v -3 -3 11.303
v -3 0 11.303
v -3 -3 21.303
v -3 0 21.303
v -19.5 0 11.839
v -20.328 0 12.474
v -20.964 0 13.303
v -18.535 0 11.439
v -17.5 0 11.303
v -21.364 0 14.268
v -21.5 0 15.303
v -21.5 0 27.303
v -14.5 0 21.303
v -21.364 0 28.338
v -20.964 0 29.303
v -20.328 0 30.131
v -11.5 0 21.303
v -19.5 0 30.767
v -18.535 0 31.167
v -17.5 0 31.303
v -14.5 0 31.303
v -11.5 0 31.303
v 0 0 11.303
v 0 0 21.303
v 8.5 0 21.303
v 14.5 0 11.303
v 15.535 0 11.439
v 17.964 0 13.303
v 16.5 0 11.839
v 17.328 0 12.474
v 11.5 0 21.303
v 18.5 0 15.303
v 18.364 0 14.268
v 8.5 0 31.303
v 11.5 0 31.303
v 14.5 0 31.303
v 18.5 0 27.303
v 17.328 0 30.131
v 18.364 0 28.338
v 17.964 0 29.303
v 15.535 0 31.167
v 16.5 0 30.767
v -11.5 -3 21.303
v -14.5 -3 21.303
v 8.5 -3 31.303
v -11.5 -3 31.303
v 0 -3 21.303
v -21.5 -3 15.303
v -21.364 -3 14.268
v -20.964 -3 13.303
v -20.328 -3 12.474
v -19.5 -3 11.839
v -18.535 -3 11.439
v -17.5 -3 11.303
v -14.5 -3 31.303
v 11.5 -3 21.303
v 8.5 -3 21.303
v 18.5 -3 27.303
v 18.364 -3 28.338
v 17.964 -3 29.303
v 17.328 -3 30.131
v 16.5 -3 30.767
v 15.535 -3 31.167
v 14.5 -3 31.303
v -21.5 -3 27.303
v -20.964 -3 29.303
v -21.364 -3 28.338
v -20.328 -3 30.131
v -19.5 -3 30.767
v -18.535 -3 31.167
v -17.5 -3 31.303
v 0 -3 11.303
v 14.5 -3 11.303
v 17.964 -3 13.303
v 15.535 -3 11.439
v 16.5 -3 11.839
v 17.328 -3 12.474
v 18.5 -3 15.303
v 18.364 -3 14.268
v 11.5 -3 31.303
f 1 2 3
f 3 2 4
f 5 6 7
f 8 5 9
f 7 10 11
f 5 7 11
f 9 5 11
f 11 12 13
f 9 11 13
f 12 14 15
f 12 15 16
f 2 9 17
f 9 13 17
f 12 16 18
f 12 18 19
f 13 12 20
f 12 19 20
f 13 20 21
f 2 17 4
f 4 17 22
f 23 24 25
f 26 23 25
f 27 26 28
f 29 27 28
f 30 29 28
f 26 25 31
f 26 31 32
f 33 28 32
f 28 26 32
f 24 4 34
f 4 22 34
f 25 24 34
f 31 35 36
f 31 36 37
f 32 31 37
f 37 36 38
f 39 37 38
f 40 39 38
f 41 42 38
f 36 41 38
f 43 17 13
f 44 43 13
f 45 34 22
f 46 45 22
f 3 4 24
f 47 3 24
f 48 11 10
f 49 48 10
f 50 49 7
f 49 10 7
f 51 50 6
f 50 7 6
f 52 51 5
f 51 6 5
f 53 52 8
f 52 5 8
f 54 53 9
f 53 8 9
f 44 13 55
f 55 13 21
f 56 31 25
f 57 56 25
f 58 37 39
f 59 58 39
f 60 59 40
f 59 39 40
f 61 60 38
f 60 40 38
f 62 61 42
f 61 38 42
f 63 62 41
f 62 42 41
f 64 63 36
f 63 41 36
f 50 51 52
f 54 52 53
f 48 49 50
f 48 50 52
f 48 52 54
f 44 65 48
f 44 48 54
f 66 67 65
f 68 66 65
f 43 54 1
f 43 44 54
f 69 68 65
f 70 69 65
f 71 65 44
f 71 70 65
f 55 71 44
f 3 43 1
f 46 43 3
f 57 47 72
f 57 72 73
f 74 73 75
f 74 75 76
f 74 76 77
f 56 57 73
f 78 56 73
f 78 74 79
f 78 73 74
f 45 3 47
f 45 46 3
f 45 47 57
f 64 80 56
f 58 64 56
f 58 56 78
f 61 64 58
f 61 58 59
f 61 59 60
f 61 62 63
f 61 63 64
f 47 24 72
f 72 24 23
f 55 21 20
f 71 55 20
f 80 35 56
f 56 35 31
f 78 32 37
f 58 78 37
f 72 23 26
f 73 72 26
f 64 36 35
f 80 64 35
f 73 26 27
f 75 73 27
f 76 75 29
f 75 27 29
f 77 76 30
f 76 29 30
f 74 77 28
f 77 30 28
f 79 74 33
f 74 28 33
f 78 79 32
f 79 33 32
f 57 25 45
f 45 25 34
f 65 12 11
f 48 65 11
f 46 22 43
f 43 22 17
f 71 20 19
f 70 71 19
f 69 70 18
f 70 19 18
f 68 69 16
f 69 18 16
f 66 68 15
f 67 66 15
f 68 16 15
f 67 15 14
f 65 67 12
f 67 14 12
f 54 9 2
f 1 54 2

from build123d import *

# Parameters (mm, degrees)
F1_DEPTH = 3


with BuildPart() as f1:
    # F0 (on Front) → F1 (new body)
    with BuildSketch(Plane.XZ):
        with BuildLine():
            Line((-14.5, 31.302889), (-17.5, 31.302889))
            ThreePointArc((-17.5, 31.302889), (-20.328427, 30.131316), (-21.5, 27.302889))
            Line((-21.5, 27.302889), (-21.5, 15.302889))
            ThreePointArc((-21.5, 15.302889), (-20.328427, 12.474462), (-17.5, 11.302889))
            Line((-17.5, 11.302889), (-3, 11.302889))
            Line((-3, 11.302889), (-3, 21.302889))
            Line((-3, 21.302889), (0, 21.302889))
            Line((0, 21.302889), (0, 11.302889))
            Line((0, 11.302889), (14.5, 11.302889))
            ThreePointArc((14.5, 11.302889), (17.328427, 12.474462), (18.5, 15.302889))
            Line((18.5, 15.302889), (18.5, 27.302889))
            ThreePointArc((18.5, 27.302889), (17.328427, 30.131316), (14.5, 31.302889))
            Line((14.5, 31.302889), (11.5, 31.302889))
            Line((11.5, 31.302889), (11.5, 21.302889))
            Line((11.5, 21.302889), (8.5, 21.302889))
            Line((8.5, 21.302889), (8.5, 31.302889))
            Line((8.5, 31.302889), (-11.5, 31.302889))
            Line((-11.5, 31.302889), (-11.5, 21.302889))
            Line((-11.5, 21.302889), (-14.5, 21.302889))
            Line((-14.5, 21.302889), (-14.5, 31.302889))
        make_face()
    extrude(amount=F1_DEPTH)


solid = f1.part
